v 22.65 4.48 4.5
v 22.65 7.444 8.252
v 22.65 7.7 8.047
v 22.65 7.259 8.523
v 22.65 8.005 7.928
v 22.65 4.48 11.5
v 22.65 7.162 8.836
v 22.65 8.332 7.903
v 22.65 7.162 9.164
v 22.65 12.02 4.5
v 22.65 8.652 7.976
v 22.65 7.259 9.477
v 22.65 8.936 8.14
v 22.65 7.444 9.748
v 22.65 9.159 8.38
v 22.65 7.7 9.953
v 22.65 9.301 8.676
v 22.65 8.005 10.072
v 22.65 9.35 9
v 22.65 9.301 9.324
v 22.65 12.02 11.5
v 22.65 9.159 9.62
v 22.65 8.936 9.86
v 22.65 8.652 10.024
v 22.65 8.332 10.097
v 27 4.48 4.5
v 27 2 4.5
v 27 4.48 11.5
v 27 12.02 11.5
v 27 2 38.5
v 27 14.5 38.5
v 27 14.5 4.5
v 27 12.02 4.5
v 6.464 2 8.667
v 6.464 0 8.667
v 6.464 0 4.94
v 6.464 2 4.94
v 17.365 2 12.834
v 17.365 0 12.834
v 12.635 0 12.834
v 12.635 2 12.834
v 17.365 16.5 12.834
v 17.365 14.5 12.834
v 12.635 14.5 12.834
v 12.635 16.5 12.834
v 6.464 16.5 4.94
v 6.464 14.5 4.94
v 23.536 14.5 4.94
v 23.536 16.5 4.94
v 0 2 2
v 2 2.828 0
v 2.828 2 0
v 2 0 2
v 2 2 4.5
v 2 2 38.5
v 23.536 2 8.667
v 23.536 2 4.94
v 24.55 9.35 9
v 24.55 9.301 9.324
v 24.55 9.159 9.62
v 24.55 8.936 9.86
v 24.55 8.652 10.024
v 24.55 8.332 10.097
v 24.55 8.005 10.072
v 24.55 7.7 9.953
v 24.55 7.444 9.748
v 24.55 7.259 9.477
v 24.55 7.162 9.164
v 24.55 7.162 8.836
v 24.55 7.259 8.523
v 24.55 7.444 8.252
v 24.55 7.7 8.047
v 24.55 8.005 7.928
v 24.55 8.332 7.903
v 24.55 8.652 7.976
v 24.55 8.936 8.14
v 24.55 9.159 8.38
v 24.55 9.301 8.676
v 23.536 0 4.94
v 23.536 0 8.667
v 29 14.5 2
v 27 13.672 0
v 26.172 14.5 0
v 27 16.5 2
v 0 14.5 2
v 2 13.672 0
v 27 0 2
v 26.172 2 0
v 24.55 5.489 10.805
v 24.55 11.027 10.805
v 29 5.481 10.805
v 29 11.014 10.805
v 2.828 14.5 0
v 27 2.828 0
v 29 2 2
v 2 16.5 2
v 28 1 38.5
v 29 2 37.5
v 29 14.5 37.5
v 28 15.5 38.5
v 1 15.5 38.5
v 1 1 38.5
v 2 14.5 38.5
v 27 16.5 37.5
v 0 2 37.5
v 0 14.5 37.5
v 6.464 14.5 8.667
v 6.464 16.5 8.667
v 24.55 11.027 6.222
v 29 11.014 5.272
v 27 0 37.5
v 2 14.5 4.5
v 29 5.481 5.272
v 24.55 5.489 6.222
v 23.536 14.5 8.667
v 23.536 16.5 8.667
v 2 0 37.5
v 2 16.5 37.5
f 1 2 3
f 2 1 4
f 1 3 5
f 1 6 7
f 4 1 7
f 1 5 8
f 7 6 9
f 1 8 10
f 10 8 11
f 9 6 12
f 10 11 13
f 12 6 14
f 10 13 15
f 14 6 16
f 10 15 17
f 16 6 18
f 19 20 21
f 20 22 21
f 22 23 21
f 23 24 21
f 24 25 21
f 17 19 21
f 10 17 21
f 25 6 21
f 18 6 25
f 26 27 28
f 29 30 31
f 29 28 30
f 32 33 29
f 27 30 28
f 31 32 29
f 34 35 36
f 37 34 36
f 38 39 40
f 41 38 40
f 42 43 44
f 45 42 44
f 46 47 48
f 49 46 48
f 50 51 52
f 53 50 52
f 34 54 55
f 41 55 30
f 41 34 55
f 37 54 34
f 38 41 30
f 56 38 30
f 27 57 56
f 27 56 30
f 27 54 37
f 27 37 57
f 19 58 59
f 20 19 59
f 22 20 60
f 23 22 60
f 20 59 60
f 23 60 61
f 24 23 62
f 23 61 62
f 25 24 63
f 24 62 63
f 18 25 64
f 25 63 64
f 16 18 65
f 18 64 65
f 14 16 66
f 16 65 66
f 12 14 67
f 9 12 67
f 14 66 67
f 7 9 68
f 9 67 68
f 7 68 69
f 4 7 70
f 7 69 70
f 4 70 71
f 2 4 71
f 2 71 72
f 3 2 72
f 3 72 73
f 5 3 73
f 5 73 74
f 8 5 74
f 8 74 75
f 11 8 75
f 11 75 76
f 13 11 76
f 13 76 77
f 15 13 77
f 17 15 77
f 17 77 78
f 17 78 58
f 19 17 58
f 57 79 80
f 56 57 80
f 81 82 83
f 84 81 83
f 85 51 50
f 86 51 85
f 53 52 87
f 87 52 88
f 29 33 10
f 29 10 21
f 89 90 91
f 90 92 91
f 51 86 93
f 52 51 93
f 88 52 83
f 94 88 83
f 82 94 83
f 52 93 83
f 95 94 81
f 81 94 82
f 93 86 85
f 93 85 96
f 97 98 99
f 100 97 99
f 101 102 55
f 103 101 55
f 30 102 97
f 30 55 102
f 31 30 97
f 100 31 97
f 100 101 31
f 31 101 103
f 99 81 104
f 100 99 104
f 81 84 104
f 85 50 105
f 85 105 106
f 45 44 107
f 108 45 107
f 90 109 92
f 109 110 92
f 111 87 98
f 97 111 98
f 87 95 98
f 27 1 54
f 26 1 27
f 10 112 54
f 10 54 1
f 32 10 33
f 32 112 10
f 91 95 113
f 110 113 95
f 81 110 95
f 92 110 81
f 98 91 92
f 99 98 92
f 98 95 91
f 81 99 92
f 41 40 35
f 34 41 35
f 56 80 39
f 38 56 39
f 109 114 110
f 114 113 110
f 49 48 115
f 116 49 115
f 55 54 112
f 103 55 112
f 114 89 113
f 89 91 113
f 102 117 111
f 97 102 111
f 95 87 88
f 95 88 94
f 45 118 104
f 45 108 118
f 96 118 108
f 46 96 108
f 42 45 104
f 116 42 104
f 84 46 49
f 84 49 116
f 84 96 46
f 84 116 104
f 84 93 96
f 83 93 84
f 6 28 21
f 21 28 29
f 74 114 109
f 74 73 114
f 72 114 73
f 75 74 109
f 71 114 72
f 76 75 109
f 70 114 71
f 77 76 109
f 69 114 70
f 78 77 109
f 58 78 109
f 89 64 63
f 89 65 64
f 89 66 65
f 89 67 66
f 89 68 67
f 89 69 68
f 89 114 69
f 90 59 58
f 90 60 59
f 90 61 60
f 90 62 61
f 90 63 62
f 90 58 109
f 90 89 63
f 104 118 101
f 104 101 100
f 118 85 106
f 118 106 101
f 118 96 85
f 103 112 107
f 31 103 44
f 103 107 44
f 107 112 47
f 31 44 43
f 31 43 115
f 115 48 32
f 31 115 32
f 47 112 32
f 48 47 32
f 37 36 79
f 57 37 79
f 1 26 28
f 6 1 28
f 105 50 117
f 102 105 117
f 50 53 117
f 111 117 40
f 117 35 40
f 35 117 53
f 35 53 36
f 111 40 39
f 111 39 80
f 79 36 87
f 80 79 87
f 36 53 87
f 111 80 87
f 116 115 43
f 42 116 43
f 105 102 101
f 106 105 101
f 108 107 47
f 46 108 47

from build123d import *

# Parameters (mm, degrees)
F0_W      = 29
F0_H      = 16.5
F1_DEPTH  = 38.5
F2_T      = -2
F3_DEPTH  = 2.5
F4_SIZE   = 2
F5_SIZE   = 2
F6_SIZE   = 0.99999
F8_DEPTH  = 16.501
F9_W      = 7.54
F9_H      = 7.25
F9_R      = 1.1
F10_DEPTH = 6.35
F13_W     = 5.538
F13_H     = 4.583
F11_W     = 5.533
F11_H     = 5.533


# Not quite as in the source:
# - a fillet or chamfer is up to 0.001 mm smaller than in the source, because OpenCascade refuses the exact size


with BuildPart() as f1:
    # F0 (on Top) → F1 (new body)
    with BuildSketch(Plane.XY):
        with Locations((14.5, 8.25)):
            Rectangle(F0_W, F0_H)
    extrude(amount=F1_DEPTH)

    # F2
    f2_openings = [f1.faces().sort_by_distance(p)[0] for p in [
        (14.5, 8.25, 38.5),
    ]]
    offset(amount=F2_T, openings=f2_openings)

    # F3 (add): a face of the model
    f3_faces = [f1.faces().sort_by_distance(p)[0] for p in [
        (14.5, 8.25, 2),
    ]]
    extrude(f3_faces, amount=F3_DEPTH)

    # F4
    f4_edges = [f1.edges().sort_by_distance(p)[0] for p in [
        (29, 0, 19.25),
        (29, 16.5, 19.25),
        (0, 0, 19.25),
        (0, 16.5, 19.25),
    ]]
    chamfer(f4_edges, length=F4_SIZE)

    # F5
    f5_edges = [f1.edges().sort_by_distance(p)[0] for p in [
        (0, 8.25, 0),
        (1, 15.5, 0),
        (1, 1, 0),
        (14.5, 16.5, 0),
        (14.5, 0, 0),
        (28, 15.5, 0),
        (28, 1, 0),
        (29, 8.25, 0),
    ]]
    chamfer(f5_edges, length=F5_SIZE)

    # F6 (size 1 in the source; OpenCascade refuses exactly that, so slightly less here)
    f6_edges = [f1.edges().sort_by_distance(p)[0] for p in [
        (14.5, 16.5, 38.5),
        (0, 8.25, 38.5),
        (14.5, 0, 38.5),
        (29, 8.25, 38.5),
    ]]
    chamfer(f6_edges, length=F6_SIZE)

    # F7 (on face) → F8 (cut, through all)
    with BuildSketch(Plane.XZ):
        Polygon((12.635, 12.834), (6.464, 8.667), (6.464, 4.94), (23.536, 4.94), (23.536, 8.667), (17.365, 12.834), align=None)
    extrude(amount=-F8_DEPTH, mode=Mode.SUBTRACT)

    # F9 (on face) → F10 (join)
    with BuildSketch(Plane.YZ.offset(29)):
        with Locations((8.25, 7.875)):
            Rectangle(F9_W, F9_H)
        with Locations((8.25, 9)):
            Circle(F9_R, mode=Mode.SUBTRACT)
    extrude(amount=-F10_DEPTH)

    # F13 (on offset) → F14 section 0
    with BuildSketch(Plane.YZ.offset(24.55)):
        with Locations((8.258, 8.5135)):
            Rectangle(F13_W, F13_H)
    # F11 (on face) → F14 section 1
    with BuildSketch(Plane.YZ.offset(29)):
        with Locations((8.2475, 8.0385)):
            Rectangle(F11_W, F11_H)
    loft(mode=Mode.SUBTRACT)


solid = f1.part
